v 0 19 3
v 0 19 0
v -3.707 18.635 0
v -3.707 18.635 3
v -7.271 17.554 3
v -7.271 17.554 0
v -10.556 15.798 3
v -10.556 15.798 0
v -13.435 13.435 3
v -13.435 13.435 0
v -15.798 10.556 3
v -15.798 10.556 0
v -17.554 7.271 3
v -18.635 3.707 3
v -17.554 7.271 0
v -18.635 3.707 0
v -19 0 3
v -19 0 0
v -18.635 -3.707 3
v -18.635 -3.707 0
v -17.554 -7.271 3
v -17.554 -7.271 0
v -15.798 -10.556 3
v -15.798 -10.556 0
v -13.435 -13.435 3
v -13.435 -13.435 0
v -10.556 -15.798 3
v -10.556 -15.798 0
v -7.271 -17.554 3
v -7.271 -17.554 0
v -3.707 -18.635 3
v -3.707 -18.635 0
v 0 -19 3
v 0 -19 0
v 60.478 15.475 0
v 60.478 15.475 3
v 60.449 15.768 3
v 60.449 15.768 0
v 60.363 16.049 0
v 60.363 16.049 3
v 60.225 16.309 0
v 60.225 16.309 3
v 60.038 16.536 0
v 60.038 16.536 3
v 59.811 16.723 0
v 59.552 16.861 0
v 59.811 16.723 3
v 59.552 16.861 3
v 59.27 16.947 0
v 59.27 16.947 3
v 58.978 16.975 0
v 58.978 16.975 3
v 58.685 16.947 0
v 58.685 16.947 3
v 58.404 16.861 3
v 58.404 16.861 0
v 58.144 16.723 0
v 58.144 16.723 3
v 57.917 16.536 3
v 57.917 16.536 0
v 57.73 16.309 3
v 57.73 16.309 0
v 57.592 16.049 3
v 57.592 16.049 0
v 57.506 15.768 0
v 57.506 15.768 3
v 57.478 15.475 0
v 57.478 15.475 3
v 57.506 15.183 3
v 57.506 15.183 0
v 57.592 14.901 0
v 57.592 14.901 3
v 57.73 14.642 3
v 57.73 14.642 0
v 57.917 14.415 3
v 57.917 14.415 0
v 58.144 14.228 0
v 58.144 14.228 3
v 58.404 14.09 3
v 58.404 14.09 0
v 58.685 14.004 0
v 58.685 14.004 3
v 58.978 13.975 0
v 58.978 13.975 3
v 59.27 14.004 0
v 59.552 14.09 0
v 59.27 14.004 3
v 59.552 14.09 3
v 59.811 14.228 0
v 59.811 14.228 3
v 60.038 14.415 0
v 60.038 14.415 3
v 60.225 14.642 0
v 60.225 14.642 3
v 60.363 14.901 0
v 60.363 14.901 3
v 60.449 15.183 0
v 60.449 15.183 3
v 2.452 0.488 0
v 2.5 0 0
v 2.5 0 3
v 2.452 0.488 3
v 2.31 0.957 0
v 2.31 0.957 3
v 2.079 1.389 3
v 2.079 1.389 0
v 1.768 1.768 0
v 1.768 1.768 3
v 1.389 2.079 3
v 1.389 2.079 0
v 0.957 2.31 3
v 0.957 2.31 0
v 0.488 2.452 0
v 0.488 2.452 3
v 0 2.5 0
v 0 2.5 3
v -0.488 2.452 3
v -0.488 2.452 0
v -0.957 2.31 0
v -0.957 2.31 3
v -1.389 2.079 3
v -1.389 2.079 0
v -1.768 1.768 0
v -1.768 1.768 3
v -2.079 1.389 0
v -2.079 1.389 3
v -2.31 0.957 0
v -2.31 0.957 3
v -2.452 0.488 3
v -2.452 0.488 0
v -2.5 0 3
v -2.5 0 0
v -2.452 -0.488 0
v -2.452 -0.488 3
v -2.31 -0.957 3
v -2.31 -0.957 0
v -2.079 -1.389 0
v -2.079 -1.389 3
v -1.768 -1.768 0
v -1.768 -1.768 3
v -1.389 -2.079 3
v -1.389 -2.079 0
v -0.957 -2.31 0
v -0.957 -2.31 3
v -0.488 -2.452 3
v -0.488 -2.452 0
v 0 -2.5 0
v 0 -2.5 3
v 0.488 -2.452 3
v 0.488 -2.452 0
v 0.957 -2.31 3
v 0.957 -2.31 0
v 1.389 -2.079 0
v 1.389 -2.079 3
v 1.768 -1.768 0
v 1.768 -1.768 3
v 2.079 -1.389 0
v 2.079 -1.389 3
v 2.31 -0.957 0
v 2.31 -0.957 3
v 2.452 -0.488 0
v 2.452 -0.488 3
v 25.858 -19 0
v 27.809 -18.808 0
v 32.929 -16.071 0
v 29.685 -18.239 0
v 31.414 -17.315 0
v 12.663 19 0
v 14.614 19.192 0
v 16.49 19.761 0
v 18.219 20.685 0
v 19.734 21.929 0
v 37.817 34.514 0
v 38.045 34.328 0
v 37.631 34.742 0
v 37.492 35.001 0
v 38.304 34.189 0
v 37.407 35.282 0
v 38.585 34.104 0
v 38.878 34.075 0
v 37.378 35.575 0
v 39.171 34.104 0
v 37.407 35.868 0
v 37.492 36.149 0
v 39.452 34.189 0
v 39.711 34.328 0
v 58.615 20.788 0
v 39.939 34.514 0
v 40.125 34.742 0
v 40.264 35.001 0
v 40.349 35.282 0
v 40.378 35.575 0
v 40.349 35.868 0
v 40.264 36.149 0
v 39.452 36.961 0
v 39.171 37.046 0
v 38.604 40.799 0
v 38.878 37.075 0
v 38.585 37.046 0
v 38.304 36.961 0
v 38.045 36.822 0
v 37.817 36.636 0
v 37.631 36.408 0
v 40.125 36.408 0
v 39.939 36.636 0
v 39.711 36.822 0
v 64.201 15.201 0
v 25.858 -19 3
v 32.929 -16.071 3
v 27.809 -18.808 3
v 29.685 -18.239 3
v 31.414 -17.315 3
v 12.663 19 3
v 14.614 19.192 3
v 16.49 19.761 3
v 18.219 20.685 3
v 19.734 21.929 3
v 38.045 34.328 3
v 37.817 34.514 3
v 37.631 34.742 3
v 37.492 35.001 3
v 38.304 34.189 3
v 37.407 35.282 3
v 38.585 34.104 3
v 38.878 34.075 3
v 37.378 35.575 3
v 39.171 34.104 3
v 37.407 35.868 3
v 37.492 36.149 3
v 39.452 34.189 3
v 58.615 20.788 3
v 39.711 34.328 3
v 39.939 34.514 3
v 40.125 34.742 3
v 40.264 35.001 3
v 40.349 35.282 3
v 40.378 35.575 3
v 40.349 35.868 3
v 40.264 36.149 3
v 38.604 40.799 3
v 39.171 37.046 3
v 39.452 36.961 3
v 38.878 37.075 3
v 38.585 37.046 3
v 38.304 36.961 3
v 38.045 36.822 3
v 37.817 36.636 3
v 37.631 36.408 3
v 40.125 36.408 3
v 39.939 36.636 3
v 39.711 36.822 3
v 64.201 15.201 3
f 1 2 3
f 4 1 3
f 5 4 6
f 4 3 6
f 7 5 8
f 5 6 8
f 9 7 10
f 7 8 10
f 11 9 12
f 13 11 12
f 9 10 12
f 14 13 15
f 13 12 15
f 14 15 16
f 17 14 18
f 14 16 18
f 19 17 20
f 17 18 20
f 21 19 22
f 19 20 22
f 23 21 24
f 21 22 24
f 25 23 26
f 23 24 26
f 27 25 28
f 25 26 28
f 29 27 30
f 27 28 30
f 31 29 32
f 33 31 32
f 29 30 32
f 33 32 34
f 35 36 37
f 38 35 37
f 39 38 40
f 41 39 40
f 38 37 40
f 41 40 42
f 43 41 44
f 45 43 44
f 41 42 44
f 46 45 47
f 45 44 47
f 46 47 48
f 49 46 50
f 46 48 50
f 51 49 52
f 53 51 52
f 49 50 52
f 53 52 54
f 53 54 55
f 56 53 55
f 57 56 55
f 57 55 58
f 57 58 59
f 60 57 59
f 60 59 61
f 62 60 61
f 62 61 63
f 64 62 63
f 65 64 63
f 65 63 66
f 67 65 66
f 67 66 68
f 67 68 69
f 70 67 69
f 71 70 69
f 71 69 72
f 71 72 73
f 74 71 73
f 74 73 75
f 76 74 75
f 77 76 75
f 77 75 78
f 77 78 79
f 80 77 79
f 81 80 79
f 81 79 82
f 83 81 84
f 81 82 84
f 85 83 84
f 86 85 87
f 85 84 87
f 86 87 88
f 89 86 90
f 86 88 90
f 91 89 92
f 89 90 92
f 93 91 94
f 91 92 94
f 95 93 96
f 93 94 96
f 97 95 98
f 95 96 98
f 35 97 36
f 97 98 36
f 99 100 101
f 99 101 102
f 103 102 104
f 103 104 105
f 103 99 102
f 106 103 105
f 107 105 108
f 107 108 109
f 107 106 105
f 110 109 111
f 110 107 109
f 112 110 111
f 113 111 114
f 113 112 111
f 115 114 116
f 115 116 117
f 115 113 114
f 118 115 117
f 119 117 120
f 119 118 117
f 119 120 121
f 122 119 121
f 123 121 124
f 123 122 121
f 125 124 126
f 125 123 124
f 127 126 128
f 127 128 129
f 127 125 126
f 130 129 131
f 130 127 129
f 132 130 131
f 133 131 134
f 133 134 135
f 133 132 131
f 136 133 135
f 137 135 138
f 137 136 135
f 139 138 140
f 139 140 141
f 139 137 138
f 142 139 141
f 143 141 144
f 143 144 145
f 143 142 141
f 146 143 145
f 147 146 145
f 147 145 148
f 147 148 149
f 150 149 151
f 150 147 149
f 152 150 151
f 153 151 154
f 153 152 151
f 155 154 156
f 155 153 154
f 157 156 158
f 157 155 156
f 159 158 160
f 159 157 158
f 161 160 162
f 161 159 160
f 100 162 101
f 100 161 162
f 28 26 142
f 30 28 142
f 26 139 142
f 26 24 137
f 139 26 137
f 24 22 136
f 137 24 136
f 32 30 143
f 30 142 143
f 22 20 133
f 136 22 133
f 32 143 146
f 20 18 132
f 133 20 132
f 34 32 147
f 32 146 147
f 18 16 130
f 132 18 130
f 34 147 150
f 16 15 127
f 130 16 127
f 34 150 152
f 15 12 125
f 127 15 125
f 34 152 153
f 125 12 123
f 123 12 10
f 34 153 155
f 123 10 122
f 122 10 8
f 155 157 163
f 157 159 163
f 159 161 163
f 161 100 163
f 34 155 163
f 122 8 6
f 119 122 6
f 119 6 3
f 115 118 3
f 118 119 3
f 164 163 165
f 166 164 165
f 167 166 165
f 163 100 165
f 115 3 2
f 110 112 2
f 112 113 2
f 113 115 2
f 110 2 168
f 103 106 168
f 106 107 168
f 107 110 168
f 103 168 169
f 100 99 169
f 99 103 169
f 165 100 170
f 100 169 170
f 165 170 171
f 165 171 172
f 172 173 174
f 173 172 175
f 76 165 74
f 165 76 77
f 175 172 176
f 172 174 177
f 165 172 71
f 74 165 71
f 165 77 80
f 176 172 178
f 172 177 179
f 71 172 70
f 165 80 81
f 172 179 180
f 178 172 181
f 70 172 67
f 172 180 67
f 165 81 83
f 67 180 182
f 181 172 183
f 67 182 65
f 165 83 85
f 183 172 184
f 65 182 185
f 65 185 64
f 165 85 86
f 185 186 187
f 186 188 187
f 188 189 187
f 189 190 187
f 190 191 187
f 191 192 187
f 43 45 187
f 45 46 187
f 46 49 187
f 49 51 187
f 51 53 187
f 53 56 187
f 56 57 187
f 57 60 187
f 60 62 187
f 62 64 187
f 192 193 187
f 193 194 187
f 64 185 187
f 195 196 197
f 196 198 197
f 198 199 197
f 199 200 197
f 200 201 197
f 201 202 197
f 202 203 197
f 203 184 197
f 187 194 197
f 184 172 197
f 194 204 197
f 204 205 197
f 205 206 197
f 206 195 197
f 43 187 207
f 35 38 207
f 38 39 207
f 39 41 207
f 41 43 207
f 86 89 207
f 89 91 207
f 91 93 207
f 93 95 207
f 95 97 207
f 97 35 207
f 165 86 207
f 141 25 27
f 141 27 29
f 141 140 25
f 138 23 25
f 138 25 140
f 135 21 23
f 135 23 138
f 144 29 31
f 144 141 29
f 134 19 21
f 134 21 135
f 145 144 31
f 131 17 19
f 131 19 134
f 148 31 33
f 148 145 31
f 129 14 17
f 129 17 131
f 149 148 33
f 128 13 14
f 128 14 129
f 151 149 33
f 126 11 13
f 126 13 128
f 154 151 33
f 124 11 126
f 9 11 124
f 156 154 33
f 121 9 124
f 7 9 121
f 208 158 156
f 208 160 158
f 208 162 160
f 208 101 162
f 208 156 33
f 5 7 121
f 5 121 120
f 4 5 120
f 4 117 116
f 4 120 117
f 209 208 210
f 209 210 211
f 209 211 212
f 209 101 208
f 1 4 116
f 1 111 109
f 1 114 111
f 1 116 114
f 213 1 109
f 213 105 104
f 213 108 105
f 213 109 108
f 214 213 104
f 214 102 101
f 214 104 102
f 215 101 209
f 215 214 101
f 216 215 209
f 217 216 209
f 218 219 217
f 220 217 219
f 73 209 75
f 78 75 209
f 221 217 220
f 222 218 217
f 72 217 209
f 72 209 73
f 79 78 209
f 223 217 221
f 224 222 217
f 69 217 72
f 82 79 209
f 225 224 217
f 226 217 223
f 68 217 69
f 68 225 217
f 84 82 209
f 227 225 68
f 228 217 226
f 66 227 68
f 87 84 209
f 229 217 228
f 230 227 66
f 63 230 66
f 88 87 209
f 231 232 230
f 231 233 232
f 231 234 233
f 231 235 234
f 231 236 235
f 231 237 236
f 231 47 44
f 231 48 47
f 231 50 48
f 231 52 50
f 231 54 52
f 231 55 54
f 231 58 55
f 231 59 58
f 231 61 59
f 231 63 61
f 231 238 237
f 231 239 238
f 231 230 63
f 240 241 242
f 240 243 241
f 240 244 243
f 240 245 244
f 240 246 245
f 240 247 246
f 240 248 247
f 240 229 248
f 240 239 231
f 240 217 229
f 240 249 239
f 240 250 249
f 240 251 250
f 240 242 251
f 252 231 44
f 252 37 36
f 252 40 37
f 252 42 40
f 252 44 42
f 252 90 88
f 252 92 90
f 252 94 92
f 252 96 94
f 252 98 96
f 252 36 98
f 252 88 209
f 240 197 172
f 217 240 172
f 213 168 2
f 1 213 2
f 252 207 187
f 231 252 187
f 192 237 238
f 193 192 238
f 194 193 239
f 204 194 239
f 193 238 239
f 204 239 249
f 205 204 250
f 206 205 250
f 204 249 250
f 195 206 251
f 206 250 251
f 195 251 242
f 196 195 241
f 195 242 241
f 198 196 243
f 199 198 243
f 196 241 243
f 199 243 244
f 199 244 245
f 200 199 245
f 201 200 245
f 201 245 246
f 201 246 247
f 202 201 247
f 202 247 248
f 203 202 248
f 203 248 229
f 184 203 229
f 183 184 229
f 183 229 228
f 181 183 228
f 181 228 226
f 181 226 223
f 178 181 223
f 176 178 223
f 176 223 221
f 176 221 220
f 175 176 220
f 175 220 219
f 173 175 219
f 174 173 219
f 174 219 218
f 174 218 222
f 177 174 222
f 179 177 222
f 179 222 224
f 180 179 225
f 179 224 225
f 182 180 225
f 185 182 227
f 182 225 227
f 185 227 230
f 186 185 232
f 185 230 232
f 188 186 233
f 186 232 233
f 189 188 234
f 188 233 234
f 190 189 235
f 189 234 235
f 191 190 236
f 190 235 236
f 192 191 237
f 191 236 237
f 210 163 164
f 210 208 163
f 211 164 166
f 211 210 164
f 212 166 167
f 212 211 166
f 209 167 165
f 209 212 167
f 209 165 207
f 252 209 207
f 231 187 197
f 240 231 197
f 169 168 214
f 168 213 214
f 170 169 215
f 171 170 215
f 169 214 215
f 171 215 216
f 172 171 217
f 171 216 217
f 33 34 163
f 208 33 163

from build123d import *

# Parameters (mm, degrees)
SKETCH1_R           = 2.5
BOSS_EXTRUDE1_DEPTH = 3
SKETCH2_R           = 1.5
CUT_EXTRUDE1_DEPTH  = 77.127156728
FILLET1_R           = 10


with BuildPart() as part:
    # Sketch1 → Boss-Extrude1 (new body)
    with BuildSketch(Plane.XY):
        with BuildLine():
            Line((0, -19), (30, -19))
            Line((30, -19), (64.201367261, 15.201367261))
            Line((64.201367261, 15.201367261), (58.615223689, 20.787510832))
            Line((58.615223689, 20.787510832), (44.190245353, 35.212489168))
            Line((44.190245353, 35.212489168), (38.604101782, 40.798632739))
            Line((38.604101782, 40.798632739), (16.805469042, 19))
            Line((16.805469042, 19), (0, 19))
            ThreePointArc((0, 19), (-19, 0), (0, -19))
        make_face()
        Circle(SKETCH1_R, mode=Mode.SUBTRACT)
    extrude(amount=BOSS_EXTRUDE1_DEPTH)

    # Sketch2 → Cut-Extrude1 (cut, through all)
    with BuildSketch(Plane.XY.offset(3)):
        with Locations((38.878105659, 35.574881393)):
            Circle(SKETCH2_R)
        with Locations((58.977615915, 15.475371138)):
            Circle(SKETCH2_R)
    extrude(amount=-CUT_EXTRUDE1_DEPTH, mode=Mode.SUBTRACT)

    # Fillet1
    fillet1_edges = [part.edges().sort_by_distance(p)[0] for p in [
        (16.805469042, 19, 1.5),
        (30, -19, 1.5),
    ]]
    fillet(fillet1_edges, radius=FILLET1_R)


solid = part.part
